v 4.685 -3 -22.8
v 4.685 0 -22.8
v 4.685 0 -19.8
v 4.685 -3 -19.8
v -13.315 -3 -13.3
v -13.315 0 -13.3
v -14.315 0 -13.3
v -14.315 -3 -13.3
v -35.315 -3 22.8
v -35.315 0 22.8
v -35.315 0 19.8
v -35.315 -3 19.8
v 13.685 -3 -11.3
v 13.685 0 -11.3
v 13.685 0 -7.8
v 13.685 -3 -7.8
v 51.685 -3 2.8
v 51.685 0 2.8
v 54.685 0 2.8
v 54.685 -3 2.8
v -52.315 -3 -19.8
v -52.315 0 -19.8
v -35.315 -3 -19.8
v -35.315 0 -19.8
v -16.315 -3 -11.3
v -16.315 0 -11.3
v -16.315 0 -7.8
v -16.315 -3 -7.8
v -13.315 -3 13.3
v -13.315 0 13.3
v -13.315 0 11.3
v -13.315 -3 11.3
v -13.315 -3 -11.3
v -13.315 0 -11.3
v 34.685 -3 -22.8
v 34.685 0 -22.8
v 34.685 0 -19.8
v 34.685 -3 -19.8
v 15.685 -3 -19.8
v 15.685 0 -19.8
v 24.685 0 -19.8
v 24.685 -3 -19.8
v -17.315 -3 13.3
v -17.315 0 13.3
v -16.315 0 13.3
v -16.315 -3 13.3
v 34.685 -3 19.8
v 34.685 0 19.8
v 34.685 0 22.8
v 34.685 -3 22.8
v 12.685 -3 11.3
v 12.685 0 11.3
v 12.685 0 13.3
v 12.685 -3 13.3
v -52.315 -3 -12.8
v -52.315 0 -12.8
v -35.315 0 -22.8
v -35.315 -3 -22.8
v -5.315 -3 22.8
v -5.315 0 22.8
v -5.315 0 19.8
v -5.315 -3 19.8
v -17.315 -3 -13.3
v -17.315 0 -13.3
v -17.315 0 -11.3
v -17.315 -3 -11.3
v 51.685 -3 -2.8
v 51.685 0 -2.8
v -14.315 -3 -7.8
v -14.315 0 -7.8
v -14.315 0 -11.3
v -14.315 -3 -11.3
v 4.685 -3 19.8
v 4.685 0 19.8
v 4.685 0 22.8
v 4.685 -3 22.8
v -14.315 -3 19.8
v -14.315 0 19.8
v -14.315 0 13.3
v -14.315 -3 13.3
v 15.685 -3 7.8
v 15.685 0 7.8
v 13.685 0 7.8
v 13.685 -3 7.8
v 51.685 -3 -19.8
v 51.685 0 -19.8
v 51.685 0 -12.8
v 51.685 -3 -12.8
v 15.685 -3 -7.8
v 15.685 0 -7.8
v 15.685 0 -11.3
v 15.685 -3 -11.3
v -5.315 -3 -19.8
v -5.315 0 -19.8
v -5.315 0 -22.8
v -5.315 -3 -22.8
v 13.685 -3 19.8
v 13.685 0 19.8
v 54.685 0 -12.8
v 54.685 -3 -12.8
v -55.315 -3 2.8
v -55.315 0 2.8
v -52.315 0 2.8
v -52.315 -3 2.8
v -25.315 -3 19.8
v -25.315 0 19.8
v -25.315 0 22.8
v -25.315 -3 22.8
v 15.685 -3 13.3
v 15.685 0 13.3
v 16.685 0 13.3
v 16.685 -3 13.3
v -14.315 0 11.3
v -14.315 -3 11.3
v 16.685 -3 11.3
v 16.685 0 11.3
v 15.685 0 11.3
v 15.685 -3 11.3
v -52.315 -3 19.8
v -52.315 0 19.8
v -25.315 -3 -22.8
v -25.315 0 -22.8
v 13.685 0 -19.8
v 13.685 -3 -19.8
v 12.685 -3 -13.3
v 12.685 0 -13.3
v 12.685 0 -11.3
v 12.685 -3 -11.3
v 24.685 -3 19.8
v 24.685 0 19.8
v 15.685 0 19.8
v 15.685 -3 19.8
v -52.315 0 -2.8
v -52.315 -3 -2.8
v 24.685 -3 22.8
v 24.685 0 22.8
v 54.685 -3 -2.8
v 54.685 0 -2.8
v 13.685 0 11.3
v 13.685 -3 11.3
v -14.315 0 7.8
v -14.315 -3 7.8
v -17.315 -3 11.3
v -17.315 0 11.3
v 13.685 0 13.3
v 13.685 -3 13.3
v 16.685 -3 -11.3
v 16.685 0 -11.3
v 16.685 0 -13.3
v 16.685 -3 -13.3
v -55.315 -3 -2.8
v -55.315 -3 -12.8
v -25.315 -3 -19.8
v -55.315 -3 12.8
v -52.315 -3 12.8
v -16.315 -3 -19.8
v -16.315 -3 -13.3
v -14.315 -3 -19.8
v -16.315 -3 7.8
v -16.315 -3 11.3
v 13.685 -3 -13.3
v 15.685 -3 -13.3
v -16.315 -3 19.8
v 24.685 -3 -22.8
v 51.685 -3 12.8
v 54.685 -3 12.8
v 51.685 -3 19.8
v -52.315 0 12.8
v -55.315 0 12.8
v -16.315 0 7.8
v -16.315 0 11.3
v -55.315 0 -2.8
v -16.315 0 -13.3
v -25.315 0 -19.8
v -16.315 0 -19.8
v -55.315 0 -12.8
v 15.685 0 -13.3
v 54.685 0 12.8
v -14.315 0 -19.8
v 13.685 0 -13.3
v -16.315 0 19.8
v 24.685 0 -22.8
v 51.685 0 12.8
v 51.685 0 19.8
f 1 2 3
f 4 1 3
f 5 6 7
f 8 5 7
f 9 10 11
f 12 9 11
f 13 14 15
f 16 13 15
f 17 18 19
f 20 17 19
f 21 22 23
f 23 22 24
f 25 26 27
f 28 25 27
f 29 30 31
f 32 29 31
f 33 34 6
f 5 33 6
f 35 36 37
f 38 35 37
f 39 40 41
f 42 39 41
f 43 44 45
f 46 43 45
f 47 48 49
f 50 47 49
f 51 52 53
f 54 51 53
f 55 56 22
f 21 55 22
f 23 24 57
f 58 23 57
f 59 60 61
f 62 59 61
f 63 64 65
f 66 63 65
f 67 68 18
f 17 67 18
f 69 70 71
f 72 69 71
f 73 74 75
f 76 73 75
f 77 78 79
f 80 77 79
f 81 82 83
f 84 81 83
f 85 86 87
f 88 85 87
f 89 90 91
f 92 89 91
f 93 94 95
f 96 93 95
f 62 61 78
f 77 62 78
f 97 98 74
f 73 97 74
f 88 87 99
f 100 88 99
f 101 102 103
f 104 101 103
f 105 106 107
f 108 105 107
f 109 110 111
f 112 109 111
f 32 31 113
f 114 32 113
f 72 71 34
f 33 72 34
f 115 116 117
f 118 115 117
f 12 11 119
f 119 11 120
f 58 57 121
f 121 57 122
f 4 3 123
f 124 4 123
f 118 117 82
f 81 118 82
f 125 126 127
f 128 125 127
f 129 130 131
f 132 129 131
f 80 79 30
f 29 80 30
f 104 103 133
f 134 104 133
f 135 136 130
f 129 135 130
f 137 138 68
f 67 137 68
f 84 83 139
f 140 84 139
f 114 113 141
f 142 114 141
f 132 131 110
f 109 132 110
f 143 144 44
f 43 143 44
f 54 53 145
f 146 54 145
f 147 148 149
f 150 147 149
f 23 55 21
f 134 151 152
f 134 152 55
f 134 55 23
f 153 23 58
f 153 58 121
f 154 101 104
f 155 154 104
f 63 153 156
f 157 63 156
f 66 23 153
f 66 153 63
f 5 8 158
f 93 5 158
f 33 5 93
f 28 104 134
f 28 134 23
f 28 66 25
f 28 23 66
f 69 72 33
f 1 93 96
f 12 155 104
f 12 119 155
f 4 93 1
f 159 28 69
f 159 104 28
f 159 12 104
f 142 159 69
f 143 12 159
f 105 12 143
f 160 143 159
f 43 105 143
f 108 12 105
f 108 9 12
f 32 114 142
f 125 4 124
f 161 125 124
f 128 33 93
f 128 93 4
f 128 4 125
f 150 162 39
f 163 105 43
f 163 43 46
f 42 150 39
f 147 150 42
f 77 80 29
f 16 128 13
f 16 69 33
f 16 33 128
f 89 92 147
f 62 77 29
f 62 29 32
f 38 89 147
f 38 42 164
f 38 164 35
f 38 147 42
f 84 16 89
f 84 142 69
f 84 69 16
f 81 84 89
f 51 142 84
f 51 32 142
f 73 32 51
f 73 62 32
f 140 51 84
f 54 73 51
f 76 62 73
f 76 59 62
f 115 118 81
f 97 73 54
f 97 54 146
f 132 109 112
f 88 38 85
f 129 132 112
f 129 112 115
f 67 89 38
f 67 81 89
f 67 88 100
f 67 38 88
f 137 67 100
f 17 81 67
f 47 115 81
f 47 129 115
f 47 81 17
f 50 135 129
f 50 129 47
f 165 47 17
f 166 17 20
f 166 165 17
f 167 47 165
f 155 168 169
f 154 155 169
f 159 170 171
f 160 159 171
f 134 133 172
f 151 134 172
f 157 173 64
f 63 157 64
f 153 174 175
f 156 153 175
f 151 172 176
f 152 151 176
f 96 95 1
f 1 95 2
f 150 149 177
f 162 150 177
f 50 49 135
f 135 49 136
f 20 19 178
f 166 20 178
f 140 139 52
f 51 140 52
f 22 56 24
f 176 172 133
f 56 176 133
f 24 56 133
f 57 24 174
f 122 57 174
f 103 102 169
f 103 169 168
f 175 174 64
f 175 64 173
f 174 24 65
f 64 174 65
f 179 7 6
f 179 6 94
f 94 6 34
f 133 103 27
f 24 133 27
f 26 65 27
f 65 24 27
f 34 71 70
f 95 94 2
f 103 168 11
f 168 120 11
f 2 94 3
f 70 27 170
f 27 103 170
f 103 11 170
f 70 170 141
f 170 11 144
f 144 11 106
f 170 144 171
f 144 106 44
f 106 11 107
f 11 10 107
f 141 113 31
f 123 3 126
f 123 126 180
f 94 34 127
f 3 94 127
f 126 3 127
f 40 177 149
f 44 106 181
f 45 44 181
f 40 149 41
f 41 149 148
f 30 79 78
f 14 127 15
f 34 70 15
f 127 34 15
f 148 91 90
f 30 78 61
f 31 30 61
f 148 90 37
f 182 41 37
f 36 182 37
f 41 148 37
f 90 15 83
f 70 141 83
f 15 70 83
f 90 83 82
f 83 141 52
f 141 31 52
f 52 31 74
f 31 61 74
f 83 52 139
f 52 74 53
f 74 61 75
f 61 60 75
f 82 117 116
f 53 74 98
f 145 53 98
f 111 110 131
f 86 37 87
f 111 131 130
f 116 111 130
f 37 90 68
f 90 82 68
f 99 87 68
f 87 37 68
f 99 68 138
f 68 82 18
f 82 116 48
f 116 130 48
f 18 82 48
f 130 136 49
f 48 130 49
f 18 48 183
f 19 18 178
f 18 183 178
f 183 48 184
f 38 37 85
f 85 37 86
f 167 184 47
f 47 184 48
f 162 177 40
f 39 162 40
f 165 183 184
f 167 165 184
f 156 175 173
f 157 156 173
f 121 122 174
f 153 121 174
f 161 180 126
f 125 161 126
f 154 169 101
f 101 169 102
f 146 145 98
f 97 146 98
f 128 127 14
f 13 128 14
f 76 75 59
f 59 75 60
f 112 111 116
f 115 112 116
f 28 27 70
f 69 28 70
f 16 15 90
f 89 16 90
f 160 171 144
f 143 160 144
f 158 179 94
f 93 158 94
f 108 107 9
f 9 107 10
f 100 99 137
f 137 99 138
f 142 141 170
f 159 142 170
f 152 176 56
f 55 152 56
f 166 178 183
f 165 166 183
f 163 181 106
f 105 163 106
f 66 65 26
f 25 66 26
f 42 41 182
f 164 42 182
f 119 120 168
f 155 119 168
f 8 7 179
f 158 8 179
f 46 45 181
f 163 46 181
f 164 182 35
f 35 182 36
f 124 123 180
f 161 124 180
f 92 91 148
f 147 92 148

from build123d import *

# Parameters (mm, degrees)
F1_DEPTH = 3


with BuildPart() as f1:
    # F0 (on Front) → F1 (new body)
    with BuildSketch(Plane.XZ):
        Polygon((-52.314732, 2.8), (-52.314732, 0), (-52.314732, -2.8), (-55.314732, -2.8), (-55.314732, -12.8), (-52.314732, -12.8), (-52.314732, -19.8), (-35.314732, -19.8), (-35.314732, -22.8), (-25.314732, -22.8), (-25.314732, -19.8), (-16.314732, -19.8), (-16.314732, -13.3), (-17.314732, -13.3), (-17.314732, -11.3), (-16.314732, -11.3), (-16.314732, -7.8), (-14.314732, -7.8), (-14.314732, -11.3), (-13.314732, -11.3), (-13.314732, -13.3), (-14.314732, -13.3), (-14.314732, -19.8), (-5.314732, -19.8), (-5.314732, -22.8), (-0.314732, -22.8), (4.685268, -22.8), (4.685268, -19.8), (13.685268, -19.8), (13.685268, -13.3), (12.685268, -13.3), (12.685268, -11.3), (13.685268, -11.3), (13.685268, -7.8), (15.685268, -7.8), (15.685268, -11.3), (16.685268, -11.3), (16.685268, -13.3), (15.685268, -13.3), (15.685268, -19.8), (24.685268, -19.8), (24.685268, -22.8), (34.685268, -22.8), (34.685268, -19.8), (51.685268, -19.8), (51.685268, -12.8), (54.685268, -12.8), (54.685268, -2.8), (51.685268, -2.8), (51.685268, 0), (51.685268, 2.8), (54.685268, 2.8), (54.685268, 12.8), (51.685268, 12.8), (51.685268, 19.8), (34.685268, 19.8), (34.685268, 22.8), (24.685268, 22.8), (24.685268, 19.8), (15.685268, 19.8), (15.685268, 13.3), (16.685268, 13.3), (16.685268, 11.3), (15.685268, 11.3), (15.685268, 7.8), (13.685268, 7.8), (13.685268, 11.3), (12.685268, 11.3), (12.685268, 13.3), (13.685268, 13.3), (13.685268, 19.8), (4.685268, 19.8), (4.685268, 22.8), (-0.314732, 22.8), (-5.314732, 22.8), (-5.314732, 19.8), (-14.314732, 19.8), (-14.314732, 13.3), (-13.314732, 13.3), (-13.314732, 11.3), (-14.314732, 11.3), (-14.314732, 7.8), (-16.314732, 7.8), (-16.314732, 11.3), (-17.314732, 11.3), (-17.314732, 13.3), (-16.314732, 13.3), (-16.314732, 19.8), (-25.314732, 19.8), (-25.314732, 22.8), (-35.314732, 22.8), (-35.314732, 19.8), (-52.314732, 19.8), (-52.314732, 12.8), (-55.314732, 12.8), (-55.314732, 2.8), align=None)
    extrude(amount=F1_DEPTH)


solid = f1.part
